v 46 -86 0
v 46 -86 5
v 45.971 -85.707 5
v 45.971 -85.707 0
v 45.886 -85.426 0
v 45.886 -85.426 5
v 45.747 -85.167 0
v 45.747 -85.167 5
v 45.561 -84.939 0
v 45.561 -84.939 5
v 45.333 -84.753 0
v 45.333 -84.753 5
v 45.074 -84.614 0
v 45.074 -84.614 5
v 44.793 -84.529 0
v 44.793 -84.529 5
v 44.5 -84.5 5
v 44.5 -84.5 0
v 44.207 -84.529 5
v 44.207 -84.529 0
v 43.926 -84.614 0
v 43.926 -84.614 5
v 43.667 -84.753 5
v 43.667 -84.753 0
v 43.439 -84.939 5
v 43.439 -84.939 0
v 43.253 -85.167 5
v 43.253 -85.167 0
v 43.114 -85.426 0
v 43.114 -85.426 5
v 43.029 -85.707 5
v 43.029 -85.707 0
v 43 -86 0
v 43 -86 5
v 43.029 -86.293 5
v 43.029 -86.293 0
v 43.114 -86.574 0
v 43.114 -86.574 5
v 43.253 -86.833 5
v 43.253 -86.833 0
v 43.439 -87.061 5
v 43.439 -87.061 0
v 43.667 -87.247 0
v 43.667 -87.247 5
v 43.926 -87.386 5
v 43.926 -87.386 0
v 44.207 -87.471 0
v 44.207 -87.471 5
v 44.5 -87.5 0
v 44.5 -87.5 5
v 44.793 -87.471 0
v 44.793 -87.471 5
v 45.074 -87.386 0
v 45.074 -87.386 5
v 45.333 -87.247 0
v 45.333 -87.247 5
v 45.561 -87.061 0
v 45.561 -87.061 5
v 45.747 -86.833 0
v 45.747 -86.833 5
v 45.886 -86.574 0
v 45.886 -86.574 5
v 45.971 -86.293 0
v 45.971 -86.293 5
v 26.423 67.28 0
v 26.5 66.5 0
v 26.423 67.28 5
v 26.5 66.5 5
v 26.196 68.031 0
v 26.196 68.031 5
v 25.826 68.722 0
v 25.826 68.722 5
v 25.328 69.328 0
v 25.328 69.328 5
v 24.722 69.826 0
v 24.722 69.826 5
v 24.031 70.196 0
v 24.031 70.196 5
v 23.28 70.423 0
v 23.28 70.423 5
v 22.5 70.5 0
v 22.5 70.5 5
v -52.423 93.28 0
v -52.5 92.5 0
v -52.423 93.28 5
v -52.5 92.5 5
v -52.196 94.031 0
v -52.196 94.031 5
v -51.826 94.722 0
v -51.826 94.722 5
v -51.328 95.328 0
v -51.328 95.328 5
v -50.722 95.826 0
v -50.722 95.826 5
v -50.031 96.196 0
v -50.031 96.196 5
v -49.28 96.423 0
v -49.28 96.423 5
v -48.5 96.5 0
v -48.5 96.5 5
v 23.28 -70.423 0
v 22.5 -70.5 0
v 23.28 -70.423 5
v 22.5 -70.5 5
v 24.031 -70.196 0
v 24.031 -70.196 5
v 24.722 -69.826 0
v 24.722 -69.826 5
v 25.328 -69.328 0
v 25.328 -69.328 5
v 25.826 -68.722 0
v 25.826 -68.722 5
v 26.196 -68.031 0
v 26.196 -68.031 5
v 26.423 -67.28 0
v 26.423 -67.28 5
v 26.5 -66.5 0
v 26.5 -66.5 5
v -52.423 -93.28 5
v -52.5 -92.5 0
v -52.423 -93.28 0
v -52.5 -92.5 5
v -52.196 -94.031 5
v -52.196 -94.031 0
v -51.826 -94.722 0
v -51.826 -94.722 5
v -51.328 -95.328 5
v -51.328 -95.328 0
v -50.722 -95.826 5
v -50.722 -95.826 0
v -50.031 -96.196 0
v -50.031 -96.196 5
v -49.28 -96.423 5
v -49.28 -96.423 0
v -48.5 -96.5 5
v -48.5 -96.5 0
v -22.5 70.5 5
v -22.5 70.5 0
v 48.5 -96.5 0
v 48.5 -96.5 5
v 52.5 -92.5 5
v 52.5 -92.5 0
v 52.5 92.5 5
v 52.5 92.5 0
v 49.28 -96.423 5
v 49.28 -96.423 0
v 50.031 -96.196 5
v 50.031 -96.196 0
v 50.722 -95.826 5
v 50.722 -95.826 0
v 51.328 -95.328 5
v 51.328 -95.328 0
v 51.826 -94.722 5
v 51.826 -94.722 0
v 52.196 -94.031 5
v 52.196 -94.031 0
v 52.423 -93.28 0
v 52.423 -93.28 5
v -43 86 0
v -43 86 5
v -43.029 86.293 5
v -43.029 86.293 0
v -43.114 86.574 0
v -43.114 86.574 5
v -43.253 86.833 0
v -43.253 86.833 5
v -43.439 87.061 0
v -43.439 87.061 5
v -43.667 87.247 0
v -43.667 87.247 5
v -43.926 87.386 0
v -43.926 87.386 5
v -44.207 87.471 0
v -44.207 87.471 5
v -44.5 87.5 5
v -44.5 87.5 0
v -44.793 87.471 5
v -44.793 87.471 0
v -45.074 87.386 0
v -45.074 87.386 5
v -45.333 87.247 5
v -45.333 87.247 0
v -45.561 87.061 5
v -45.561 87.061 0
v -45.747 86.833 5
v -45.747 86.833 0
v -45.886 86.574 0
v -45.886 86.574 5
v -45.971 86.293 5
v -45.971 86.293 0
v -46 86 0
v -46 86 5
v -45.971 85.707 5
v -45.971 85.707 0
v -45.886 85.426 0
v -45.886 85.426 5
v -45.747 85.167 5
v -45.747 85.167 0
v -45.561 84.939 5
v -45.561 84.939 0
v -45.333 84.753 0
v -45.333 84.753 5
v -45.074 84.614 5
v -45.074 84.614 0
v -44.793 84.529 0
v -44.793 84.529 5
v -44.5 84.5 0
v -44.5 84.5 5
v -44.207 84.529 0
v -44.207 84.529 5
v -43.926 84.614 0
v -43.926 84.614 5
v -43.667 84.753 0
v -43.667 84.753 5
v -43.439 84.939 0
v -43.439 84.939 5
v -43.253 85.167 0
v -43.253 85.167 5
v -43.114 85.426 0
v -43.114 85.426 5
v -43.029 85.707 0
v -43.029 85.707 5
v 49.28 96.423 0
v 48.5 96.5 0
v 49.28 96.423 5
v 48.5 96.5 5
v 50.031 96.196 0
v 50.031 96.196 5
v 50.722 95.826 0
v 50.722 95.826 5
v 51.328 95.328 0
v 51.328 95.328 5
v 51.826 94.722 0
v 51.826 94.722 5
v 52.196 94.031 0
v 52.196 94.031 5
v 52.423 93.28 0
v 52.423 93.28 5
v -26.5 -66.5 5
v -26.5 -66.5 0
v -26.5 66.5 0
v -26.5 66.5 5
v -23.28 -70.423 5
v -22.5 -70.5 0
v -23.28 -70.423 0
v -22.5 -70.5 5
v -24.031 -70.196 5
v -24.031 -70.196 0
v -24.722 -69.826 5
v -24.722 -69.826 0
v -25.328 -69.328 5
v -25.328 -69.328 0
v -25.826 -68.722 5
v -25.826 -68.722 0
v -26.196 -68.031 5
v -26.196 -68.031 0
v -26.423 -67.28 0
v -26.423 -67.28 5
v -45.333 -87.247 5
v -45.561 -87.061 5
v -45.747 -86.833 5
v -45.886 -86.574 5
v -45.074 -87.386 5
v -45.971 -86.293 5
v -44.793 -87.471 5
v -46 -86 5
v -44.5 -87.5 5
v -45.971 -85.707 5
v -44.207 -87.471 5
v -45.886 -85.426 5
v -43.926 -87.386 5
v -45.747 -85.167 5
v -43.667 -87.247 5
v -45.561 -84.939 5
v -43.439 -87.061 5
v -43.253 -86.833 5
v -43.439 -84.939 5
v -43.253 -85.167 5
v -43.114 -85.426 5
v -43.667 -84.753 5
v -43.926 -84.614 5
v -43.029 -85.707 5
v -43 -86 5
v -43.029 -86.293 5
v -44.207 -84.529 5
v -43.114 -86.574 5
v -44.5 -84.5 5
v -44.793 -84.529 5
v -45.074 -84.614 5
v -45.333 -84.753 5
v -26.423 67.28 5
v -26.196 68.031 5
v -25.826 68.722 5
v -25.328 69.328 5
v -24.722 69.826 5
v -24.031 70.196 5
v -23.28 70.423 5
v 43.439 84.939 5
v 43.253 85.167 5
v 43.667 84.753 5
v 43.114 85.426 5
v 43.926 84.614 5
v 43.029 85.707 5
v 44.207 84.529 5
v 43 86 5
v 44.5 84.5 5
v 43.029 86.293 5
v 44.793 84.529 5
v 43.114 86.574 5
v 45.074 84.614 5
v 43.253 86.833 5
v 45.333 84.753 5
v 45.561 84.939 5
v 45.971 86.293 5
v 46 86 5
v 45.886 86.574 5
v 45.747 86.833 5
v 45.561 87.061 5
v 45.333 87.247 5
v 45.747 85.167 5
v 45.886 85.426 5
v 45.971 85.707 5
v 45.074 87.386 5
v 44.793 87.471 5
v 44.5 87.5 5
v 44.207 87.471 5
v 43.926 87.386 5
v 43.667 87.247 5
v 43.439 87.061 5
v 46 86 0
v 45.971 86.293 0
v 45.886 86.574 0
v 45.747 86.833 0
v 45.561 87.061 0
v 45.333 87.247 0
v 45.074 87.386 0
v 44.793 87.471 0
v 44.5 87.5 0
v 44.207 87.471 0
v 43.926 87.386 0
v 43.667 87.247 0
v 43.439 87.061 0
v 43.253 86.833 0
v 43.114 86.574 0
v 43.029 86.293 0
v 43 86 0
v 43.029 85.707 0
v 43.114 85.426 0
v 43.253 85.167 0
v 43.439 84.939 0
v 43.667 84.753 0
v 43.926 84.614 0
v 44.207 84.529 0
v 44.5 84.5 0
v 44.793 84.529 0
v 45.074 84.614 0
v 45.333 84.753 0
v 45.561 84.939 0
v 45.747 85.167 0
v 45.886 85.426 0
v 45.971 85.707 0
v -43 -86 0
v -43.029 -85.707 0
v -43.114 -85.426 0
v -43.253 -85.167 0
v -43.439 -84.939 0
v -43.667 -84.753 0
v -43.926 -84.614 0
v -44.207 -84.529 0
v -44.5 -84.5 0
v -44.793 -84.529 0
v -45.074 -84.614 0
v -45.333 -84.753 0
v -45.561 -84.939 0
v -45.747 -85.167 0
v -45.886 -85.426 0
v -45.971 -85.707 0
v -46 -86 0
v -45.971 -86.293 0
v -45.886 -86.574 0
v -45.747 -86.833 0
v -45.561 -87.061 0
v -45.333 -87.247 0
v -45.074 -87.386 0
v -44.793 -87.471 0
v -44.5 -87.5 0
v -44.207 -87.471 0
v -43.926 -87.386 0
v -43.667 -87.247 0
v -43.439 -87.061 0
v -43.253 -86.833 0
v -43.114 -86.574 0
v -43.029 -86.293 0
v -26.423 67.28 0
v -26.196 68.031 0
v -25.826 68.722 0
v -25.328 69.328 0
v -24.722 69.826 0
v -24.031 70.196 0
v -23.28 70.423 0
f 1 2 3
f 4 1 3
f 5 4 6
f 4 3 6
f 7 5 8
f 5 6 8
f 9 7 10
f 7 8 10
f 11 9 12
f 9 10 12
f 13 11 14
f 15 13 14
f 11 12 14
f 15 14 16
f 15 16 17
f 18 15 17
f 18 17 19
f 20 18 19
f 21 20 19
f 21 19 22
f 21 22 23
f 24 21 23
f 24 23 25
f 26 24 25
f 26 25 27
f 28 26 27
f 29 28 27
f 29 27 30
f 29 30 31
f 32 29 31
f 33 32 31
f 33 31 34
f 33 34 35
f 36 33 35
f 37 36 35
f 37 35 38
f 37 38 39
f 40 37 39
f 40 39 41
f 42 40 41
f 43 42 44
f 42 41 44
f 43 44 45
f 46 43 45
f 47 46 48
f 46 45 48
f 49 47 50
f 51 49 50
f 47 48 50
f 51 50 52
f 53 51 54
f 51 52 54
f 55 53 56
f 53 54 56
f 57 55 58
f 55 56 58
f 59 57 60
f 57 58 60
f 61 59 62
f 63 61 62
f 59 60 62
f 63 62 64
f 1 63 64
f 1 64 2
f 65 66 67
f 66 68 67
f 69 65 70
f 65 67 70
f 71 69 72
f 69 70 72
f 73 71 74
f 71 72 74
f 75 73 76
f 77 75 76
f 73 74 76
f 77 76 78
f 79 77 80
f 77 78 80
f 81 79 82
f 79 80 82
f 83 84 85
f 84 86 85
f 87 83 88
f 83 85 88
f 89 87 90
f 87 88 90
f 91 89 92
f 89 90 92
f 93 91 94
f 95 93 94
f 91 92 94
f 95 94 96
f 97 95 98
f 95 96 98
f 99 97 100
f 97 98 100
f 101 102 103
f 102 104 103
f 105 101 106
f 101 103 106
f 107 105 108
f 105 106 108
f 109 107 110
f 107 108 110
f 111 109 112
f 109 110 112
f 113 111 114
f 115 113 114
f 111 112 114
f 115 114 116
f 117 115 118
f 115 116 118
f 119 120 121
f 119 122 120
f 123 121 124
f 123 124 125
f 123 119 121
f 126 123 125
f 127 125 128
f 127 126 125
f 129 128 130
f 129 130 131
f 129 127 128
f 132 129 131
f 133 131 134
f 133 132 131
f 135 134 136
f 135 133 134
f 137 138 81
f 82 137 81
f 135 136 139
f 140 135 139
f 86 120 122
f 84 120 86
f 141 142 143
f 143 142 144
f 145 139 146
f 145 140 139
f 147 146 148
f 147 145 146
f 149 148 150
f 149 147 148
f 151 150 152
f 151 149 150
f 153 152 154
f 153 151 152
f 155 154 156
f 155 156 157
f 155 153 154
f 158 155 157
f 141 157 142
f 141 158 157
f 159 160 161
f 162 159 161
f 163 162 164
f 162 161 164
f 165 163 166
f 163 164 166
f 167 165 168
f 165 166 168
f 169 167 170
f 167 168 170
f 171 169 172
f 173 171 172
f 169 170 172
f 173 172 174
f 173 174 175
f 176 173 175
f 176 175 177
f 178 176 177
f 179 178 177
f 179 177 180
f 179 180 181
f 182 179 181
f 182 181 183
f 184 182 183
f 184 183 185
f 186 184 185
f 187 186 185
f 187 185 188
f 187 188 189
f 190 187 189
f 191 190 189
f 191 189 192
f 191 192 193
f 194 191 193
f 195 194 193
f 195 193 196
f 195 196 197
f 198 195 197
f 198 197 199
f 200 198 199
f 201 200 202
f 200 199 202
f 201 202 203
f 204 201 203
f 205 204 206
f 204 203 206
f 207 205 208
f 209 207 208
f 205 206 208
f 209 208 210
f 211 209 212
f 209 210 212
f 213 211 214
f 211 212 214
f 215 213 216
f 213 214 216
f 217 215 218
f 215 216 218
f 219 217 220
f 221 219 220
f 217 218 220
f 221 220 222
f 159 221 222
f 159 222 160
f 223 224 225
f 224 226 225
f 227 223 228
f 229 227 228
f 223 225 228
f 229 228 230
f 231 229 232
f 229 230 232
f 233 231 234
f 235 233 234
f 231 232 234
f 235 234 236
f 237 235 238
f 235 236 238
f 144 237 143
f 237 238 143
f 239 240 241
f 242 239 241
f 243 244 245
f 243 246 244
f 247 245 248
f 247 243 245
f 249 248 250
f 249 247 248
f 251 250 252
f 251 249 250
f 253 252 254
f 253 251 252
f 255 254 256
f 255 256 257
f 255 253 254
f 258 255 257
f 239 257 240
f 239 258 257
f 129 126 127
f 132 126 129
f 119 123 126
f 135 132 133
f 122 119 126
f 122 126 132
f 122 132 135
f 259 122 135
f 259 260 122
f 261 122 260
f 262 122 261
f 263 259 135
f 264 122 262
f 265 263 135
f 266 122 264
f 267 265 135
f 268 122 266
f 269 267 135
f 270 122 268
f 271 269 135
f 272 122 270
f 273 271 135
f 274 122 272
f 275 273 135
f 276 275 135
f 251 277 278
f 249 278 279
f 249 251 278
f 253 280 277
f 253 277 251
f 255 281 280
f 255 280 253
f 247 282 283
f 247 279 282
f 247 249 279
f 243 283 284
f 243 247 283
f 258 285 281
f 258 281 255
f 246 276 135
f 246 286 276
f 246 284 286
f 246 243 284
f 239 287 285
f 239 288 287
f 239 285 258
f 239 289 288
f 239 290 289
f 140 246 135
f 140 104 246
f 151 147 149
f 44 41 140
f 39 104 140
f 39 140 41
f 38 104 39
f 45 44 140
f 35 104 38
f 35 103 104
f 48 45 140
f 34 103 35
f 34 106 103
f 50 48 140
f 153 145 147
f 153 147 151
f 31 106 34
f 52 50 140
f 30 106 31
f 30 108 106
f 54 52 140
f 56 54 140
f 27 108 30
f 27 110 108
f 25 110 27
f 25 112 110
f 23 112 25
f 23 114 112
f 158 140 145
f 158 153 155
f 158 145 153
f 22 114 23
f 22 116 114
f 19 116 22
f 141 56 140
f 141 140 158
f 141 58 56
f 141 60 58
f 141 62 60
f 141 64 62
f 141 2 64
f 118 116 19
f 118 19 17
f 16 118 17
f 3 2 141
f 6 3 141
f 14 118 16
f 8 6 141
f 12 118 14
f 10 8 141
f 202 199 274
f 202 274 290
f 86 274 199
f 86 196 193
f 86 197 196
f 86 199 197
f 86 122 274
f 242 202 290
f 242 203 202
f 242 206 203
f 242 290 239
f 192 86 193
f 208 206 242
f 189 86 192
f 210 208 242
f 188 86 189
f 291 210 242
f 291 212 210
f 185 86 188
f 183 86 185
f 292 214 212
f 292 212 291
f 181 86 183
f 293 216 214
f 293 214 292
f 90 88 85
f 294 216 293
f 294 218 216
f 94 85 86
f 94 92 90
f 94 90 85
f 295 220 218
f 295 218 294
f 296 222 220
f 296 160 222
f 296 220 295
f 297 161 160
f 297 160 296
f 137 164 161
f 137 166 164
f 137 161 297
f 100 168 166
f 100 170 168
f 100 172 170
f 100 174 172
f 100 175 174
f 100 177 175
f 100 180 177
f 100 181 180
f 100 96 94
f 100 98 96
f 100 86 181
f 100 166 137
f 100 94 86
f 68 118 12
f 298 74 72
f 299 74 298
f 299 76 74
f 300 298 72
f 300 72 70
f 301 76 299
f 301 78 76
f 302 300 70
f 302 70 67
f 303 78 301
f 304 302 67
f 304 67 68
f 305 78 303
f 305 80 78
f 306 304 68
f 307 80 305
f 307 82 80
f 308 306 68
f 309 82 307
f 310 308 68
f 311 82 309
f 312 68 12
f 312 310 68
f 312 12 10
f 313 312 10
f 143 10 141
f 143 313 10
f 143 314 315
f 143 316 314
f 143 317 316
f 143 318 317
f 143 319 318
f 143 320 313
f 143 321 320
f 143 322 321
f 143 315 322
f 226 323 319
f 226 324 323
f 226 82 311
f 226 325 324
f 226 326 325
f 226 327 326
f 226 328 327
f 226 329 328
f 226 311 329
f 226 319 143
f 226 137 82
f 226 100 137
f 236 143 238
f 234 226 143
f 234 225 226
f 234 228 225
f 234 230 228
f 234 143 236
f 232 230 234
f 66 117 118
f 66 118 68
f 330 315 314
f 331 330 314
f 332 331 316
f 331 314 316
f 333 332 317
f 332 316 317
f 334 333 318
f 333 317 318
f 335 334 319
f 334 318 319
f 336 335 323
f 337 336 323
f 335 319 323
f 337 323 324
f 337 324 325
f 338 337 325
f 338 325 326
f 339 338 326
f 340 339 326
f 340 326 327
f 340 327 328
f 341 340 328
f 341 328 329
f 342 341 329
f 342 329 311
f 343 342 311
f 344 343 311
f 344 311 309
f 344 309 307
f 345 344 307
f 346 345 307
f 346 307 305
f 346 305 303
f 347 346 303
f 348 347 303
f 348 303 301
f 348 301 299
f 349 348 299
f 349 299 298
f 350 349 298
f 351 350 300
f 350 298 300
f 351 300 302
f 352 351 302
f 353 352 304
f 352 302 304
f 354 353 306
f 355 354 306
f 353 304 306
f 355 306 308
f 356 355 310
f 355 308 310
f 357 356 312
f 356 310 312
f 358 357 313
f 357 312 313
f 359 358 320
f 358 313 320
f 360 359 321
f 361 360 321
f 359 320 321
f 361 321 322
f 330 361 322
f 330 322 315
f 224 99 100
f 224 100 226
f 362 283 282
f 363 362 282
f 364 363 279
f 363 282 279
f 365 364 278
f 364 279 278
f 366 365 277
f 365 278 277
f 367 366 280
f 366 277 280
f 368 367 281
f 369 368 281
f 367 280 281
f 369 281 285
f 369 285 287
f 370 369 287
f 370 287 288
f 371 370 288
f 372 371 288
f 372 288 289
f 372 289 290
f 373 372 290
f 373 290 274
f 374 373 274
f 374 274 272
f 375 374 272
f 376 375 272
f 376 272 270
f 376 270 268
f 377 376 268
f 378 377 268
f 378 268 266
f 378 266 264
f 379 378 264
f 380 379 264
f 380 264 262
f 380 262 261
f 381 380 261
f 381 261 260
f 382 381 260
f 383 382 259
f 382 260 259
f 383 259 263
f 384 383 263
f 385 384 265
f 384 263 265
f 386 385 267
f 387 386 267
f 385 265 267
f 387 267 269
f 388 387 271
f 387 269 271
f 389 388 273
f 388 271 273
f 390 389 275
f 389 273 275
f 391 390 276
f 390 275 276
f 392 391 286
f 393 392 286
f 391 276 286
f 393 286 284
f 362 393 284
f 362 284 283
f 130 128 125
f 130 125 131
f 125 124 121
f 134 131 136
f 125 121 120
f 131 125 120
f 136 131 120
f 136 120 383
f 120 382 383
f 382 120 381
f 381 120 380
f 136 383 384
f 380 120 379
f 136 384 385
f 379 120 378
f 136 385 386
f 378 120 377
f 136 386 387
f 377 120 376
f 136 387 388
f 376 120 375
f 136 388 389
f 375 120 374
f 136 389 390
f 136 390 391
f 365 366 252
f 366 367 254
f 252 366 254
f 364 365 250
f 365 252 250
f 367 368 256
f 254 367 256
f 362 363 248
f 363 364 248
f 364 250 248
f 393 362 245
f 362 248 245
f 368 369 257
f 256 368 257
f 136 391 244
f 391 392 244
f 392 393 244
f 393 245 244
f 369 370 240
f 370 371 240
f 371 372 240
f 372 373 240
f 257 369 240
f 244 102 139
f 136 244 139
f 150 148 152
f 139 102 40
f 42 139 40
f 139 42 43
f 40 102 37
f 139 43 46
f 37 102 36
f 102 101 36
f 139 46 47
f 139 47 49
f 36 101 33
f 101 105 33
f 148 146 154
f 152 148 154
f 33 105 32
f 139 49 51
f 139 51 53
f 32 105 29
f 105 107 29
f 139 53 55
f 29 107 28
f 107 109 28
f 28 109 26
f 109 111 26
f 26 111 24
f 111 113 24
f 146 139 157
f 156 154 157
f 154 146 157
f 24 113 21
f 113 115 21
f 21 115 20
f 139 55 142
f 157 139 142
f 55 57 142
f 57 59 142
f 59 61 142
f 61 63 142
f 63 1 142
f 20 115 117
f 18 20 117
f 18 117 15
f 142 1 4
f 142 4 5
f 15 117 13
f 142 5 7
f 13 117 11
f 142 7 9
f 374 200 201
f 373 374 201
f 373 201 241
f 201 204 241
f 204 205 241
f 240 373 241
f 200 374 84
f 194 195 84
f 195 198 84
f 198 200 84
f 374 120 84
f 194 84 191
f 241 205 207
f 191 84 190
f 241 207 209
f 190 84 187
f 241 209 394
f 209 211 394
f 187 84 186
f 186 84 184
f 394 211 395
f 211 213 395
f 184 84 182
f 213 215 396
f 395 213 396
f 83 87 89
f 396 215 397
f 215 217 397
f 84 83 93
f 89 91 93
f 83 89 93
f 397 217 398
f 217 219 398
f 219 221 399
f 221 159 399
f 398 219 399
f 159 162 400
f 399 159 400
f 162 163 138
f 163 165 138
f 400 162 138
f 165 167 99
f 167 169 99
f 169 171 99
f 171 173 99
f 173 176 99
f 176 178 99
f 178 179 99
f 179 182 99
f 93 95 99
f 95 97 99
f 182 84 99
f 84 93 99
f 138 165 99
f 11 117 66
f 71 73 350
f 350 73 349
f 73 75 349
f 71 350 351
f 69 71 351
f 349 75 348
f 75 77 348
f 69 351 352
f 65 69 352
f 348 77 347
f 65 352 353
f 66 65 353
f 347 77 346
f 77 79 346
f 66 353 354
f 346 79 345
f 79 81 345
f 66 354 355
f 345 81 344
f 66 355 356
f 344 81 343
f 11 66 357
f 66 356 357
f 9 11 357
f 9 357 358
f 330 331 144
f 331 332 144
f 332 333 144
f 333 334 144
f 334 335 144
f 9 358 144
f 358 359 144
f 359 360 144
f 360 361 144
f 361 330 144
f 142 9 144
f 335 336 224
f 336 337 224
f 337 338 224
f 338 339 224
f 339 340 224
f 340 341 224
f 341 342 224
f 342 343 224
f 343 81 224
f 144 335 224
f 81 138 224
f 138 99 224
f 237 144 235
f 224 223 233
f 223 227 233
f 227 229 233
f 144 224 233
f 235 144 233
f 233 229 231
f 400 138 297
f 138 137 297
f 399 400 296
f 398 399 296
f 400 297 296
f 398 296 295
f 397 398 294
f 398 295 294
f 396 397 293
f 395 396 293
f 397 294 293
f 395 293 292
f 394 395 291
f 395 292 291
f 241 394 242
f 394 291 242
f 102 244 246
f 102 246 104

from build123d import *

# Parameters (mm, degrees)
SKETCH_W        = 105
SKETCH_H        = 193
PAD_DEPTH       = 5
SKETCH001_R     = 1.5
POCKET_DEPTH    = 5.001
SKETCH003_W     = 53
SKETCH003_H     = 141
POCKET002_DEPTH = 5.001
FILLET_R        = 4


with BuildPart() as part:
    # Sketch → Pad (new body)
    with BuildSketch(Plane.XY):
        Rectangle(SKETCH_W, SKETCH_H)
    extrude(amount=PAD_DEPTH)

    # Sketch001 (on Face6 of Pad) → Pocket (cut, through all)
    with BuildSketch(Plane.XY.offset(5)):
        with Locations((-44.5, 86)):
            Circle(SKETCH001_R)
        with Locations((44.5, 86)):
            Circle(SKETCH001_R)
        with Locations((-44.5, -86)):
            Circle(SKETCH001_R)
        with Locations((44.5, -86)):
            Circle(SKETCH001_R)
    extrude(amount=-POCKET_DEPTH, mode=Mode.SUBTRACT)

    # Sketch003 → Pocket002 (cut, through all)
    with BuildSketch(Plane.XY):
        Rectangle(SKETCH003_W, SKETCH003_H)
    extrude(amount=POCKET002_DEPTH, mode=Mode.SUBTRACT)

    # Fillet
    fillet_edges = [part.edges().sort_by_distance(p)[0] for p in [
        (-52.5, 96.5, 2.5),
        (-52.5, -96.5, 2.5),
        (52.5, -96.5, 2.5),
        (52.5, 96.5, 2.5),
        (26.5, 70.5, 2.5),
        (26.5, -70.5, 2.5),
        (-26.5, -70.5, 2.5),
        (-26.5, 70.5, 2.5),
    ]]
    fillet(fillet_edges, radius=FILLET_R)


solid = part.part
